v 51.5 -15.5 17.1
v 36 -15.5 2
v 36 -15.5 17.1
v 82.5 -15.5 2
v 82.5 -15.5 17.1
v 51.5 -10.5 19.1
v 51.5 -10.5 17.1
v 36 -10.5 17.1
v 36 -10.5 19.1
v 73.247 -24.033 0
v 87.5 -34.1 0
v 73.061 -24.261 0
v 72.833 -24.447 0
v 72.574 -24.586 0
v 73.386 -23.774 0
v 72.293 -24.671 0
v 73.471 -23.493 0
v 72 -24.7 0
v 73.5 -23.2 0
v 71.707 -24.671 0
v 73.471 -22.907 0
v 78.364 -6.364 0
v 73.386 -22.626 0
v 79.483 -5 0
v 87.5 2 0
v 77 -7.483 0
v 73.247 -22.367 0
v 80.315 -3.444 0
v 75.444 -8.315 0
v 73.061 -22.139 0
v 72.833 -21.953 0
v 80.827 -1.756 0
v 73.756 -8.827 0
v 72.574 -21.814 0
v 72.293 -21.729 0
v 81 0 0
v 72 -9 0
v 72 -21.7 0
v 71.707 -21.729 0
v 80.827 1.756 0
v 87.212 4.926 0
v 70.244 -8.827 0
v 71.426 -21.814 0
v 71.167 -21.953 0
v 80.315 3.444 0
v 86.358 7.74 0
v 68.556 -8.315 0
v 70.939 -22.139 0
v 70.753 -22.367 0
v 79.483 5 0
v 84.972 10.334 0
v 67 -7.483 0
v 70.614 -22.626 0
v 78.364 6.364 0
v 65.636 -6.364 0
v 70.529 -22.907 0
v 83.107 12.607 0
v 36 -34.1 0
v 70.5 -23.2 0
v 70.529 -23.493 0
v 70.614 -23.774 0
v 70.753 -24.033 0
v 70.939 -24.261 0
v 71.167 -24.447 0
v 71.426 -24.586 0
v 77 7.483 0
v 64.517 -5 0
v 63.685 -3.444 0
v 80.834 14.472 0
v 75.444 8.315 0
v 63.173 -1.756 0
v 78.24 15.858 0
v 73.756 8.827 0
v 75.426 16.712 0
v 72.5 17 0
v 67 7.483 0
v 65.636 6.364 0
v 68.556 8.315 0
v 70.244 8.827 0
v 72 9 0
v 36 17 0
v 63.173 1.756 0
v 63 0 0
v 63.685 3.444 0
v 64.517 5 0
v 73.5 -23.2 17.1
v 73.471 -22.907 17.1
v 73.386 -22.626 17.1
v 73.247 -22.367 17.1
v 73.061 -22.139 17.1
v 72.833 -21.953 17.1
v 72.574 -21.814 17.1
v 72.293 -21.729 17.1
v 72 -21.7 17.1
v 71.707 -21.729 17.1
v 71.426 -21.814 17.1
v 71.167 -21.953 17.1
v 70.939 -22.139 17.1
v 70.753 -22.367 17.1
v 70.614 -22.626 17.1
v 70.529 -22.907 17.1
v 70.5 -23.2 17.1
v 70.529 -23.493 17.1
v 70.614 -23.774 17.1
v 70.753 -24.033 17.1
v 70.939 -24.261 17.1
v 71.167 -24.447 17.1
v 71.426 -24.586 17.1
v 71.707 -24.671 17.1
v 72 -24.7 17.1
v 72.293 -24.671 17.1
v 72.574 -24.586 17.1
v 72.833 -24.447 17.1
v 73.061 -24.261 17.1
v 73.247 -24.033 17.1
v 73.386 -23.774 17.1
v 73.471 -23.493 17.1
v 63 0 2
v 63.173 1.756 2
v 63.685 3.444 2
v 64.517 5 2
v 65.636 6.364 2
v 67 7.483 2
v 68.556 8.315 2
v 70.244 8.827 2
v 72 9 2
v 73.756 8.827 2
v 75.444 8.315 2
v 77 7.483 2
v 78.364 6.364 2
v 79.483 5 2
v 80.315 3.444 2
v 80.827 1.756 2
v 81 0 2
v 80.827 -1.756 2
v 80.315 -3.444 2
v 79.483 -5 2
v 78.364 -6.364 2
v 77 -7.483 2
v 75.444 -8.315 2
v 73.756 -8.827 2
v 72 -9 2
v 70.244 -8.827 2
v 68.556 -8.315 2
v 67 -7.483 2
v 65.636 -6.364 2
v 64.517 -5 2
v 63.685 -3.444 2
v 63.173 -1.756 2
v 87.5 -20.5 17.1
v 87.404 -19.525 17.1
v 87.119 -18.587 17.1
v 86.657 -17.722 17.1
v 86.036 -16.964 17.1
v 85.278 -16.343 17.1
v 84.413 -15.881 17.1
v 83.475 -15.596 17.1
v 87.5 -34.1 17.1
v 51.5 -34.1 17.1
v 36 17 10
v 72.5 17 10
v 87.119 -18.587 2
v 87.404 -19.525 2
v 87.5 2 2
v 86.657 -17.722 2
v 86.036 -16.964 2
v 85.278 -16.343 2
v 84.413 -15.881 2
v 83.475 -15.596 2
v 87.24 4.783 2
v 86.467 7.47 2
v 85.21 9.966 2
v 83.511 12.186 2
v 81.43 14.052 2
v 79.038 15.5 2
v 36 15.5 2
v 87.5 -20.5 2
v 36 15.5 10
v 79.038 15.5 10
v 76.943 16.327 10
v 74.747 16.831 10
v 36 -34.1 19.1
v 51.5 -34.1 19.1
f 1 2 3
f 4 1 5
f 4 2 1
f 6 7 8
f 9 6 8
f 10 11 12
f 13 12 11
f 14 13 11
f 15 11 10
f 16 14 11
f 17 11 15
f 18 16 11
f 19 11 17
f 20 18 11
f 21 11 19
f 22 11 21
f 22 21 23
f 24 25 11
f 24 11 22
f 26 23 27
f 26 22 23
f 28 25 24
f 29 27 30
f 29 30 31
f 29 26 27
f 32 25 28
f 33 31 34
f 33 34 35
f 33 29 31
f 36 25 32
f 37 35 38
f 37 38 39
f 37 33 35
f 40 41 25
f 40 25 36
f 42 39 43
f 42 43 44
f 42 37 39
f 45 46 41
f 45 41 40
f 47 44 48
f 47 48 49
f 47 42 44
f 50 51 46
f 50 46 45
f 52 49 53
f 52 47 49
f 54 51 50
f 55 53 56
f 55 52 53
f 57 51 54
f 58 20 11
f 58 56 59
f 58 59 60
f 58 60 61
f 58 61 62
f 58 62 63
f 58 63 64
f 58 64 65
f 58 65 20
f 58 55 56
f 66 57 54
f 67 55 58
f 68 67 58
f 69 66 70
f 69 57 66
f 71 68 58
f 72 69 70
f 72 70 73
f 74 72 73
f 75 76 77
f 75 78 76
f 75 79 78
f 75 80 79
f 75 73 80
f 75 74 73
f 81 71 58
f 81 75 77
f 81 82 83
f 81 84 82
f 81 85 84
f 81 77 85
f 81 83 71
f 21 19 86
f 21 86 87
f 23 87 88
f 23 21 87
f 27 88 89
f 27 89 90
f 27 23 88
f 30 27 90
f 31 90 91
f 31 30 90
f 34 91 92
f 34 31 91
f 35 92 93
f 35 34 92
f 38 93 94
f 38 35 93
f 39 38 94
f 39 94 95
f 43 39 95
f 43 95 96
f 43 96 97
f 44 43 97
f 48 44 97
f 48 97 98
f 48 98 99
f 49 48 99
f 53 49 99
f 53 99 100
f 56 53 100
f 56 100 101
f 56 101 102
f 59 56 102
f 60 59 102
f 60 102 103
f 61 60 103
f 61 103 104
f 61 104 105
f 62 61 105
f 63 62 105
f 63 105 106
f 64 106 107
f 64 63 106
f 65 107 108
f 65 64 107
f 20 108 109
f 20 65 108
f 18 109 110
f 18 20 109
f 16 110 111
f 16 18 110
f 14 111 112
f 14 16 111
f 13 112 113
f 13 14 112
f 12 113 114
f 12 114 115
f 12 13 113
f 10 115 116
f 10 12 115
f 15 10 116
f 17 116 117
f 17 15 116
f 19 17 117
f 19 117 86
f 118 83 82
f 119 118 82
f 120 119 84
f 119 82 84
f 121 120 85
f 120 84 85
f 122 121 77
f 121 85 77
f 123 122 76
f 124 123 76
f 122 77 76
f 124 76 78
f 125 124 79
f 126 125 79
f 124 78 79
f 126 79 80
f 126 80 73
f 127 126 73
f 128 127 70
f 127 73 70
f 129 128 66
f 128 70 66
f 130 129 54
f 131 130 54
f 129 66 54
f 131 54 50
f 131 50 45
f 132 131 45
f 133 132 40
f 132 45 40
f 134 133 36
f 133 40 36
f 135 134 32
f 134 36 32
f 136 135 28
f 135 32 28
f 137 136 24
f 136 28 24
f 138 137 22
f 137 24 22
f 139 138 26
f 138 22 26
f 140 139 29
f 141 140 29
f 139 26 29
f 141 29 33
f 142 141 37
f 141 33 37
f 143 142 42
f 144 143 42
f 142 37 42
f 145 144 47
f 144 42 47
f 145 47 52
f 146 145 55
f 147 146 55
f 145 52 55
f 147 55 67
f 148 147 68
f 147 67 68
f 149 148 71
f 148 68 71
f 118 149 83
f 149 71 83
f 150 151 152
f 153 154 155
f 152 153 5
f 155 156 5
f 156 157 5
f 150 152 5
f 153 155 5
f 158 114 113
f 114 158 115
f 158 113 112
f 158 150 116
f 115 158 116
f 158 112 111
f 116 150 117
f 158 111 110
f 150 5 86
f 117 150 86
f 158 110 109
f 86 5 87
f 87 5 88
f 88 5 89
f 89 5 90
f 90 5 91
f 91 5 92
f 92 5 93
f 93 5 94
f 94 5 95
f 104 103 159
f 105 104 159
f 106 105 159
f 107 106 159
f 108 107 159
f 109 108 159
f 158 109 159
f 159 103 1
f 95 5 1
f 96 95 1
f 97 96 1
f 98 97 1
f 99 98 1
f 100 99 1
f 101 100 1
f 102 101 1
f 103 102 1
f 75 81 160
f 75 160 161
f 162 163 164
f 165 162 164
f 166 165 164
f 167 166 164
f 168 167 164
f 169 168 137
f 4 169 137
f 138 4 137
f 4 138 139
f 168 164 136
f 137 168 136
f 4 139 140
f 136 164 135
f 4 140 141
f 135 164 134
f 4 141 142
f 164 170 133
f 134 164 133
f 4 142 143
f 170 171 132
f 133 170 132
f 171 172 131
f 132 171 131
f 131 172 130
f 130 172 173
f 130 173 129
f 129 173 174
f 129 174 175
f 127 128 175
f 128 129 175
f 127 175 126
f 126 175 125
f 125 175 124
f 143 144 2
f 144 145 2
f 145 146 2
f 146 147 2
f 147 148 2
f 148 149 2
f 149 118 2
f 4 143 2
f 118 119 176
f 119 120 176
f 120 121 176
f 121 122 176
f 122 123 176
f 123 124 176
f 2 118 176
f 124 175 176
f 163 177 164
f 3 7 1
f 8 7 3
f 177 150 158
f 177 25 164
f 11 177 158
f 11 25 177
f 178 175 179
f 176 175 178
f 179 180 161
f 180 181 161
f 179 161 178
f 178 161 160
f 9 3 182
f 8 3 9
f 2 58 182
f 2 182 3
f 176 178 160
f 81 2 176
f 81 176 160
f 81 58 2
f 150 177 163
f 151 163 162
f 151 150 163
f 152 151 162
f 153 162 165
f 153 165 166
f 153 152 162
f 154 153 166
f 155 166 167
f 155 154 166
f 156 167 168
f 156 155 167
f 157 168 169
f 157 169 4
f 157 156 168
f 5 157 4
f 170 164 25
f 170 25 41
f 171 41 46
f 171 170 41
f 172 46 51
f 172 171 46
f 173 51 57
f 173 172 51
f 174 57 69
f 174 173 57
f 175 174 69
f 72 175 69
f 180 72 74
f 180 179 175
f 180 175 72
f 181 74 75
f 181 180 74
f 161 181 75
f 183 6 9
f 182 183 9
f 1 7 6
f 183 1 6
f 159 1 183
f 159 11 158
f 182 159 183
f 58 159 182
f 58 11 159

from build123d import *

# Parameters (mm, degrees)
F1_DEPTH = 17.1
F0_W     = 31
F0_H     = 31
F0_R     = 9
F0_W_2   = 20.5
F2_DEPTH = 2
F3_DEPTH = 10
F4_R     = 15
F5_W     = 15.5
F5_H     = 5
F5_H_2   = 18.6
F6_DEPTH = 2
F7_D     = 3
F8_R     = 5


with BuildPart() as f1:
    # F0 (on Top) → F1 (new body)
    with BuildSketch(Plane.XY):
        Polygon((36, -15.5), (15.5, -15.5), (-15.5, -15.5), (-15.5, -34.1), (36, -34.1), align=None)
    extrude(amount=F1_DEPTH)

    # F0 (on Top) → F2 (join)
    with BuildSketch(Plane.XY):
        Rectangle(F0_W, F0_H)
        Circle(F0_R, mode=Mode.SUBTRACT)
        with Locations((25.75, 0)):
            Rectangle(F0_W_2, F0_H)
    extrude(amount=F2_DEPTH)

    # F0 (on Top) → F3 (join)
    with BuildSketch(Plane.XY):
        Polygon((-15.5, 15.5), (15.5, 15.5), (36, 15.5), (36, 17), (-15.5, 17), align=None)
    extrude(amount=F3_DEPTH)

    # F4
    f4_edges = [f1.edges().sort_by_distance(p)[0] for p in [
        (-15.5, 17, 5),
    ]]
    fillet(f4_edges, radius=F4_R)

    # F5 (on face) → F6 (join)
    with BuildSketch(Plane.XY.offset(17.1)):
        with Locations((28.25, -13)):
            Rectangle(F5_W, F5_H)
        with Locations((28.25, -24.8)):
            Rectangle(F5_W, F5_H_2)
    extrude(amount=F6_DEPTH)

    # F7 (through all)
    with Locations(Plane.XY.offset(17.1)):
        with Locations((0, -23.2)):
            Hole(F7_D / 2)

    # F8
    f8_edges = [f1.edges().sort_by_distance(p)[0] for p in [
        (-15.5, -15.5, 9.55),
    ]]
    fillet(f8_edges, radius=F8_R)


with BuildPart() as f9_1:
    # F9: instance of F1
    add(f1.part.mirror(Plane(origin=(36, -19.66422, 8.390388), x_dir=(0, 1, 0), z_dir=(1, 0, 0))))


solid = f9_1.part
